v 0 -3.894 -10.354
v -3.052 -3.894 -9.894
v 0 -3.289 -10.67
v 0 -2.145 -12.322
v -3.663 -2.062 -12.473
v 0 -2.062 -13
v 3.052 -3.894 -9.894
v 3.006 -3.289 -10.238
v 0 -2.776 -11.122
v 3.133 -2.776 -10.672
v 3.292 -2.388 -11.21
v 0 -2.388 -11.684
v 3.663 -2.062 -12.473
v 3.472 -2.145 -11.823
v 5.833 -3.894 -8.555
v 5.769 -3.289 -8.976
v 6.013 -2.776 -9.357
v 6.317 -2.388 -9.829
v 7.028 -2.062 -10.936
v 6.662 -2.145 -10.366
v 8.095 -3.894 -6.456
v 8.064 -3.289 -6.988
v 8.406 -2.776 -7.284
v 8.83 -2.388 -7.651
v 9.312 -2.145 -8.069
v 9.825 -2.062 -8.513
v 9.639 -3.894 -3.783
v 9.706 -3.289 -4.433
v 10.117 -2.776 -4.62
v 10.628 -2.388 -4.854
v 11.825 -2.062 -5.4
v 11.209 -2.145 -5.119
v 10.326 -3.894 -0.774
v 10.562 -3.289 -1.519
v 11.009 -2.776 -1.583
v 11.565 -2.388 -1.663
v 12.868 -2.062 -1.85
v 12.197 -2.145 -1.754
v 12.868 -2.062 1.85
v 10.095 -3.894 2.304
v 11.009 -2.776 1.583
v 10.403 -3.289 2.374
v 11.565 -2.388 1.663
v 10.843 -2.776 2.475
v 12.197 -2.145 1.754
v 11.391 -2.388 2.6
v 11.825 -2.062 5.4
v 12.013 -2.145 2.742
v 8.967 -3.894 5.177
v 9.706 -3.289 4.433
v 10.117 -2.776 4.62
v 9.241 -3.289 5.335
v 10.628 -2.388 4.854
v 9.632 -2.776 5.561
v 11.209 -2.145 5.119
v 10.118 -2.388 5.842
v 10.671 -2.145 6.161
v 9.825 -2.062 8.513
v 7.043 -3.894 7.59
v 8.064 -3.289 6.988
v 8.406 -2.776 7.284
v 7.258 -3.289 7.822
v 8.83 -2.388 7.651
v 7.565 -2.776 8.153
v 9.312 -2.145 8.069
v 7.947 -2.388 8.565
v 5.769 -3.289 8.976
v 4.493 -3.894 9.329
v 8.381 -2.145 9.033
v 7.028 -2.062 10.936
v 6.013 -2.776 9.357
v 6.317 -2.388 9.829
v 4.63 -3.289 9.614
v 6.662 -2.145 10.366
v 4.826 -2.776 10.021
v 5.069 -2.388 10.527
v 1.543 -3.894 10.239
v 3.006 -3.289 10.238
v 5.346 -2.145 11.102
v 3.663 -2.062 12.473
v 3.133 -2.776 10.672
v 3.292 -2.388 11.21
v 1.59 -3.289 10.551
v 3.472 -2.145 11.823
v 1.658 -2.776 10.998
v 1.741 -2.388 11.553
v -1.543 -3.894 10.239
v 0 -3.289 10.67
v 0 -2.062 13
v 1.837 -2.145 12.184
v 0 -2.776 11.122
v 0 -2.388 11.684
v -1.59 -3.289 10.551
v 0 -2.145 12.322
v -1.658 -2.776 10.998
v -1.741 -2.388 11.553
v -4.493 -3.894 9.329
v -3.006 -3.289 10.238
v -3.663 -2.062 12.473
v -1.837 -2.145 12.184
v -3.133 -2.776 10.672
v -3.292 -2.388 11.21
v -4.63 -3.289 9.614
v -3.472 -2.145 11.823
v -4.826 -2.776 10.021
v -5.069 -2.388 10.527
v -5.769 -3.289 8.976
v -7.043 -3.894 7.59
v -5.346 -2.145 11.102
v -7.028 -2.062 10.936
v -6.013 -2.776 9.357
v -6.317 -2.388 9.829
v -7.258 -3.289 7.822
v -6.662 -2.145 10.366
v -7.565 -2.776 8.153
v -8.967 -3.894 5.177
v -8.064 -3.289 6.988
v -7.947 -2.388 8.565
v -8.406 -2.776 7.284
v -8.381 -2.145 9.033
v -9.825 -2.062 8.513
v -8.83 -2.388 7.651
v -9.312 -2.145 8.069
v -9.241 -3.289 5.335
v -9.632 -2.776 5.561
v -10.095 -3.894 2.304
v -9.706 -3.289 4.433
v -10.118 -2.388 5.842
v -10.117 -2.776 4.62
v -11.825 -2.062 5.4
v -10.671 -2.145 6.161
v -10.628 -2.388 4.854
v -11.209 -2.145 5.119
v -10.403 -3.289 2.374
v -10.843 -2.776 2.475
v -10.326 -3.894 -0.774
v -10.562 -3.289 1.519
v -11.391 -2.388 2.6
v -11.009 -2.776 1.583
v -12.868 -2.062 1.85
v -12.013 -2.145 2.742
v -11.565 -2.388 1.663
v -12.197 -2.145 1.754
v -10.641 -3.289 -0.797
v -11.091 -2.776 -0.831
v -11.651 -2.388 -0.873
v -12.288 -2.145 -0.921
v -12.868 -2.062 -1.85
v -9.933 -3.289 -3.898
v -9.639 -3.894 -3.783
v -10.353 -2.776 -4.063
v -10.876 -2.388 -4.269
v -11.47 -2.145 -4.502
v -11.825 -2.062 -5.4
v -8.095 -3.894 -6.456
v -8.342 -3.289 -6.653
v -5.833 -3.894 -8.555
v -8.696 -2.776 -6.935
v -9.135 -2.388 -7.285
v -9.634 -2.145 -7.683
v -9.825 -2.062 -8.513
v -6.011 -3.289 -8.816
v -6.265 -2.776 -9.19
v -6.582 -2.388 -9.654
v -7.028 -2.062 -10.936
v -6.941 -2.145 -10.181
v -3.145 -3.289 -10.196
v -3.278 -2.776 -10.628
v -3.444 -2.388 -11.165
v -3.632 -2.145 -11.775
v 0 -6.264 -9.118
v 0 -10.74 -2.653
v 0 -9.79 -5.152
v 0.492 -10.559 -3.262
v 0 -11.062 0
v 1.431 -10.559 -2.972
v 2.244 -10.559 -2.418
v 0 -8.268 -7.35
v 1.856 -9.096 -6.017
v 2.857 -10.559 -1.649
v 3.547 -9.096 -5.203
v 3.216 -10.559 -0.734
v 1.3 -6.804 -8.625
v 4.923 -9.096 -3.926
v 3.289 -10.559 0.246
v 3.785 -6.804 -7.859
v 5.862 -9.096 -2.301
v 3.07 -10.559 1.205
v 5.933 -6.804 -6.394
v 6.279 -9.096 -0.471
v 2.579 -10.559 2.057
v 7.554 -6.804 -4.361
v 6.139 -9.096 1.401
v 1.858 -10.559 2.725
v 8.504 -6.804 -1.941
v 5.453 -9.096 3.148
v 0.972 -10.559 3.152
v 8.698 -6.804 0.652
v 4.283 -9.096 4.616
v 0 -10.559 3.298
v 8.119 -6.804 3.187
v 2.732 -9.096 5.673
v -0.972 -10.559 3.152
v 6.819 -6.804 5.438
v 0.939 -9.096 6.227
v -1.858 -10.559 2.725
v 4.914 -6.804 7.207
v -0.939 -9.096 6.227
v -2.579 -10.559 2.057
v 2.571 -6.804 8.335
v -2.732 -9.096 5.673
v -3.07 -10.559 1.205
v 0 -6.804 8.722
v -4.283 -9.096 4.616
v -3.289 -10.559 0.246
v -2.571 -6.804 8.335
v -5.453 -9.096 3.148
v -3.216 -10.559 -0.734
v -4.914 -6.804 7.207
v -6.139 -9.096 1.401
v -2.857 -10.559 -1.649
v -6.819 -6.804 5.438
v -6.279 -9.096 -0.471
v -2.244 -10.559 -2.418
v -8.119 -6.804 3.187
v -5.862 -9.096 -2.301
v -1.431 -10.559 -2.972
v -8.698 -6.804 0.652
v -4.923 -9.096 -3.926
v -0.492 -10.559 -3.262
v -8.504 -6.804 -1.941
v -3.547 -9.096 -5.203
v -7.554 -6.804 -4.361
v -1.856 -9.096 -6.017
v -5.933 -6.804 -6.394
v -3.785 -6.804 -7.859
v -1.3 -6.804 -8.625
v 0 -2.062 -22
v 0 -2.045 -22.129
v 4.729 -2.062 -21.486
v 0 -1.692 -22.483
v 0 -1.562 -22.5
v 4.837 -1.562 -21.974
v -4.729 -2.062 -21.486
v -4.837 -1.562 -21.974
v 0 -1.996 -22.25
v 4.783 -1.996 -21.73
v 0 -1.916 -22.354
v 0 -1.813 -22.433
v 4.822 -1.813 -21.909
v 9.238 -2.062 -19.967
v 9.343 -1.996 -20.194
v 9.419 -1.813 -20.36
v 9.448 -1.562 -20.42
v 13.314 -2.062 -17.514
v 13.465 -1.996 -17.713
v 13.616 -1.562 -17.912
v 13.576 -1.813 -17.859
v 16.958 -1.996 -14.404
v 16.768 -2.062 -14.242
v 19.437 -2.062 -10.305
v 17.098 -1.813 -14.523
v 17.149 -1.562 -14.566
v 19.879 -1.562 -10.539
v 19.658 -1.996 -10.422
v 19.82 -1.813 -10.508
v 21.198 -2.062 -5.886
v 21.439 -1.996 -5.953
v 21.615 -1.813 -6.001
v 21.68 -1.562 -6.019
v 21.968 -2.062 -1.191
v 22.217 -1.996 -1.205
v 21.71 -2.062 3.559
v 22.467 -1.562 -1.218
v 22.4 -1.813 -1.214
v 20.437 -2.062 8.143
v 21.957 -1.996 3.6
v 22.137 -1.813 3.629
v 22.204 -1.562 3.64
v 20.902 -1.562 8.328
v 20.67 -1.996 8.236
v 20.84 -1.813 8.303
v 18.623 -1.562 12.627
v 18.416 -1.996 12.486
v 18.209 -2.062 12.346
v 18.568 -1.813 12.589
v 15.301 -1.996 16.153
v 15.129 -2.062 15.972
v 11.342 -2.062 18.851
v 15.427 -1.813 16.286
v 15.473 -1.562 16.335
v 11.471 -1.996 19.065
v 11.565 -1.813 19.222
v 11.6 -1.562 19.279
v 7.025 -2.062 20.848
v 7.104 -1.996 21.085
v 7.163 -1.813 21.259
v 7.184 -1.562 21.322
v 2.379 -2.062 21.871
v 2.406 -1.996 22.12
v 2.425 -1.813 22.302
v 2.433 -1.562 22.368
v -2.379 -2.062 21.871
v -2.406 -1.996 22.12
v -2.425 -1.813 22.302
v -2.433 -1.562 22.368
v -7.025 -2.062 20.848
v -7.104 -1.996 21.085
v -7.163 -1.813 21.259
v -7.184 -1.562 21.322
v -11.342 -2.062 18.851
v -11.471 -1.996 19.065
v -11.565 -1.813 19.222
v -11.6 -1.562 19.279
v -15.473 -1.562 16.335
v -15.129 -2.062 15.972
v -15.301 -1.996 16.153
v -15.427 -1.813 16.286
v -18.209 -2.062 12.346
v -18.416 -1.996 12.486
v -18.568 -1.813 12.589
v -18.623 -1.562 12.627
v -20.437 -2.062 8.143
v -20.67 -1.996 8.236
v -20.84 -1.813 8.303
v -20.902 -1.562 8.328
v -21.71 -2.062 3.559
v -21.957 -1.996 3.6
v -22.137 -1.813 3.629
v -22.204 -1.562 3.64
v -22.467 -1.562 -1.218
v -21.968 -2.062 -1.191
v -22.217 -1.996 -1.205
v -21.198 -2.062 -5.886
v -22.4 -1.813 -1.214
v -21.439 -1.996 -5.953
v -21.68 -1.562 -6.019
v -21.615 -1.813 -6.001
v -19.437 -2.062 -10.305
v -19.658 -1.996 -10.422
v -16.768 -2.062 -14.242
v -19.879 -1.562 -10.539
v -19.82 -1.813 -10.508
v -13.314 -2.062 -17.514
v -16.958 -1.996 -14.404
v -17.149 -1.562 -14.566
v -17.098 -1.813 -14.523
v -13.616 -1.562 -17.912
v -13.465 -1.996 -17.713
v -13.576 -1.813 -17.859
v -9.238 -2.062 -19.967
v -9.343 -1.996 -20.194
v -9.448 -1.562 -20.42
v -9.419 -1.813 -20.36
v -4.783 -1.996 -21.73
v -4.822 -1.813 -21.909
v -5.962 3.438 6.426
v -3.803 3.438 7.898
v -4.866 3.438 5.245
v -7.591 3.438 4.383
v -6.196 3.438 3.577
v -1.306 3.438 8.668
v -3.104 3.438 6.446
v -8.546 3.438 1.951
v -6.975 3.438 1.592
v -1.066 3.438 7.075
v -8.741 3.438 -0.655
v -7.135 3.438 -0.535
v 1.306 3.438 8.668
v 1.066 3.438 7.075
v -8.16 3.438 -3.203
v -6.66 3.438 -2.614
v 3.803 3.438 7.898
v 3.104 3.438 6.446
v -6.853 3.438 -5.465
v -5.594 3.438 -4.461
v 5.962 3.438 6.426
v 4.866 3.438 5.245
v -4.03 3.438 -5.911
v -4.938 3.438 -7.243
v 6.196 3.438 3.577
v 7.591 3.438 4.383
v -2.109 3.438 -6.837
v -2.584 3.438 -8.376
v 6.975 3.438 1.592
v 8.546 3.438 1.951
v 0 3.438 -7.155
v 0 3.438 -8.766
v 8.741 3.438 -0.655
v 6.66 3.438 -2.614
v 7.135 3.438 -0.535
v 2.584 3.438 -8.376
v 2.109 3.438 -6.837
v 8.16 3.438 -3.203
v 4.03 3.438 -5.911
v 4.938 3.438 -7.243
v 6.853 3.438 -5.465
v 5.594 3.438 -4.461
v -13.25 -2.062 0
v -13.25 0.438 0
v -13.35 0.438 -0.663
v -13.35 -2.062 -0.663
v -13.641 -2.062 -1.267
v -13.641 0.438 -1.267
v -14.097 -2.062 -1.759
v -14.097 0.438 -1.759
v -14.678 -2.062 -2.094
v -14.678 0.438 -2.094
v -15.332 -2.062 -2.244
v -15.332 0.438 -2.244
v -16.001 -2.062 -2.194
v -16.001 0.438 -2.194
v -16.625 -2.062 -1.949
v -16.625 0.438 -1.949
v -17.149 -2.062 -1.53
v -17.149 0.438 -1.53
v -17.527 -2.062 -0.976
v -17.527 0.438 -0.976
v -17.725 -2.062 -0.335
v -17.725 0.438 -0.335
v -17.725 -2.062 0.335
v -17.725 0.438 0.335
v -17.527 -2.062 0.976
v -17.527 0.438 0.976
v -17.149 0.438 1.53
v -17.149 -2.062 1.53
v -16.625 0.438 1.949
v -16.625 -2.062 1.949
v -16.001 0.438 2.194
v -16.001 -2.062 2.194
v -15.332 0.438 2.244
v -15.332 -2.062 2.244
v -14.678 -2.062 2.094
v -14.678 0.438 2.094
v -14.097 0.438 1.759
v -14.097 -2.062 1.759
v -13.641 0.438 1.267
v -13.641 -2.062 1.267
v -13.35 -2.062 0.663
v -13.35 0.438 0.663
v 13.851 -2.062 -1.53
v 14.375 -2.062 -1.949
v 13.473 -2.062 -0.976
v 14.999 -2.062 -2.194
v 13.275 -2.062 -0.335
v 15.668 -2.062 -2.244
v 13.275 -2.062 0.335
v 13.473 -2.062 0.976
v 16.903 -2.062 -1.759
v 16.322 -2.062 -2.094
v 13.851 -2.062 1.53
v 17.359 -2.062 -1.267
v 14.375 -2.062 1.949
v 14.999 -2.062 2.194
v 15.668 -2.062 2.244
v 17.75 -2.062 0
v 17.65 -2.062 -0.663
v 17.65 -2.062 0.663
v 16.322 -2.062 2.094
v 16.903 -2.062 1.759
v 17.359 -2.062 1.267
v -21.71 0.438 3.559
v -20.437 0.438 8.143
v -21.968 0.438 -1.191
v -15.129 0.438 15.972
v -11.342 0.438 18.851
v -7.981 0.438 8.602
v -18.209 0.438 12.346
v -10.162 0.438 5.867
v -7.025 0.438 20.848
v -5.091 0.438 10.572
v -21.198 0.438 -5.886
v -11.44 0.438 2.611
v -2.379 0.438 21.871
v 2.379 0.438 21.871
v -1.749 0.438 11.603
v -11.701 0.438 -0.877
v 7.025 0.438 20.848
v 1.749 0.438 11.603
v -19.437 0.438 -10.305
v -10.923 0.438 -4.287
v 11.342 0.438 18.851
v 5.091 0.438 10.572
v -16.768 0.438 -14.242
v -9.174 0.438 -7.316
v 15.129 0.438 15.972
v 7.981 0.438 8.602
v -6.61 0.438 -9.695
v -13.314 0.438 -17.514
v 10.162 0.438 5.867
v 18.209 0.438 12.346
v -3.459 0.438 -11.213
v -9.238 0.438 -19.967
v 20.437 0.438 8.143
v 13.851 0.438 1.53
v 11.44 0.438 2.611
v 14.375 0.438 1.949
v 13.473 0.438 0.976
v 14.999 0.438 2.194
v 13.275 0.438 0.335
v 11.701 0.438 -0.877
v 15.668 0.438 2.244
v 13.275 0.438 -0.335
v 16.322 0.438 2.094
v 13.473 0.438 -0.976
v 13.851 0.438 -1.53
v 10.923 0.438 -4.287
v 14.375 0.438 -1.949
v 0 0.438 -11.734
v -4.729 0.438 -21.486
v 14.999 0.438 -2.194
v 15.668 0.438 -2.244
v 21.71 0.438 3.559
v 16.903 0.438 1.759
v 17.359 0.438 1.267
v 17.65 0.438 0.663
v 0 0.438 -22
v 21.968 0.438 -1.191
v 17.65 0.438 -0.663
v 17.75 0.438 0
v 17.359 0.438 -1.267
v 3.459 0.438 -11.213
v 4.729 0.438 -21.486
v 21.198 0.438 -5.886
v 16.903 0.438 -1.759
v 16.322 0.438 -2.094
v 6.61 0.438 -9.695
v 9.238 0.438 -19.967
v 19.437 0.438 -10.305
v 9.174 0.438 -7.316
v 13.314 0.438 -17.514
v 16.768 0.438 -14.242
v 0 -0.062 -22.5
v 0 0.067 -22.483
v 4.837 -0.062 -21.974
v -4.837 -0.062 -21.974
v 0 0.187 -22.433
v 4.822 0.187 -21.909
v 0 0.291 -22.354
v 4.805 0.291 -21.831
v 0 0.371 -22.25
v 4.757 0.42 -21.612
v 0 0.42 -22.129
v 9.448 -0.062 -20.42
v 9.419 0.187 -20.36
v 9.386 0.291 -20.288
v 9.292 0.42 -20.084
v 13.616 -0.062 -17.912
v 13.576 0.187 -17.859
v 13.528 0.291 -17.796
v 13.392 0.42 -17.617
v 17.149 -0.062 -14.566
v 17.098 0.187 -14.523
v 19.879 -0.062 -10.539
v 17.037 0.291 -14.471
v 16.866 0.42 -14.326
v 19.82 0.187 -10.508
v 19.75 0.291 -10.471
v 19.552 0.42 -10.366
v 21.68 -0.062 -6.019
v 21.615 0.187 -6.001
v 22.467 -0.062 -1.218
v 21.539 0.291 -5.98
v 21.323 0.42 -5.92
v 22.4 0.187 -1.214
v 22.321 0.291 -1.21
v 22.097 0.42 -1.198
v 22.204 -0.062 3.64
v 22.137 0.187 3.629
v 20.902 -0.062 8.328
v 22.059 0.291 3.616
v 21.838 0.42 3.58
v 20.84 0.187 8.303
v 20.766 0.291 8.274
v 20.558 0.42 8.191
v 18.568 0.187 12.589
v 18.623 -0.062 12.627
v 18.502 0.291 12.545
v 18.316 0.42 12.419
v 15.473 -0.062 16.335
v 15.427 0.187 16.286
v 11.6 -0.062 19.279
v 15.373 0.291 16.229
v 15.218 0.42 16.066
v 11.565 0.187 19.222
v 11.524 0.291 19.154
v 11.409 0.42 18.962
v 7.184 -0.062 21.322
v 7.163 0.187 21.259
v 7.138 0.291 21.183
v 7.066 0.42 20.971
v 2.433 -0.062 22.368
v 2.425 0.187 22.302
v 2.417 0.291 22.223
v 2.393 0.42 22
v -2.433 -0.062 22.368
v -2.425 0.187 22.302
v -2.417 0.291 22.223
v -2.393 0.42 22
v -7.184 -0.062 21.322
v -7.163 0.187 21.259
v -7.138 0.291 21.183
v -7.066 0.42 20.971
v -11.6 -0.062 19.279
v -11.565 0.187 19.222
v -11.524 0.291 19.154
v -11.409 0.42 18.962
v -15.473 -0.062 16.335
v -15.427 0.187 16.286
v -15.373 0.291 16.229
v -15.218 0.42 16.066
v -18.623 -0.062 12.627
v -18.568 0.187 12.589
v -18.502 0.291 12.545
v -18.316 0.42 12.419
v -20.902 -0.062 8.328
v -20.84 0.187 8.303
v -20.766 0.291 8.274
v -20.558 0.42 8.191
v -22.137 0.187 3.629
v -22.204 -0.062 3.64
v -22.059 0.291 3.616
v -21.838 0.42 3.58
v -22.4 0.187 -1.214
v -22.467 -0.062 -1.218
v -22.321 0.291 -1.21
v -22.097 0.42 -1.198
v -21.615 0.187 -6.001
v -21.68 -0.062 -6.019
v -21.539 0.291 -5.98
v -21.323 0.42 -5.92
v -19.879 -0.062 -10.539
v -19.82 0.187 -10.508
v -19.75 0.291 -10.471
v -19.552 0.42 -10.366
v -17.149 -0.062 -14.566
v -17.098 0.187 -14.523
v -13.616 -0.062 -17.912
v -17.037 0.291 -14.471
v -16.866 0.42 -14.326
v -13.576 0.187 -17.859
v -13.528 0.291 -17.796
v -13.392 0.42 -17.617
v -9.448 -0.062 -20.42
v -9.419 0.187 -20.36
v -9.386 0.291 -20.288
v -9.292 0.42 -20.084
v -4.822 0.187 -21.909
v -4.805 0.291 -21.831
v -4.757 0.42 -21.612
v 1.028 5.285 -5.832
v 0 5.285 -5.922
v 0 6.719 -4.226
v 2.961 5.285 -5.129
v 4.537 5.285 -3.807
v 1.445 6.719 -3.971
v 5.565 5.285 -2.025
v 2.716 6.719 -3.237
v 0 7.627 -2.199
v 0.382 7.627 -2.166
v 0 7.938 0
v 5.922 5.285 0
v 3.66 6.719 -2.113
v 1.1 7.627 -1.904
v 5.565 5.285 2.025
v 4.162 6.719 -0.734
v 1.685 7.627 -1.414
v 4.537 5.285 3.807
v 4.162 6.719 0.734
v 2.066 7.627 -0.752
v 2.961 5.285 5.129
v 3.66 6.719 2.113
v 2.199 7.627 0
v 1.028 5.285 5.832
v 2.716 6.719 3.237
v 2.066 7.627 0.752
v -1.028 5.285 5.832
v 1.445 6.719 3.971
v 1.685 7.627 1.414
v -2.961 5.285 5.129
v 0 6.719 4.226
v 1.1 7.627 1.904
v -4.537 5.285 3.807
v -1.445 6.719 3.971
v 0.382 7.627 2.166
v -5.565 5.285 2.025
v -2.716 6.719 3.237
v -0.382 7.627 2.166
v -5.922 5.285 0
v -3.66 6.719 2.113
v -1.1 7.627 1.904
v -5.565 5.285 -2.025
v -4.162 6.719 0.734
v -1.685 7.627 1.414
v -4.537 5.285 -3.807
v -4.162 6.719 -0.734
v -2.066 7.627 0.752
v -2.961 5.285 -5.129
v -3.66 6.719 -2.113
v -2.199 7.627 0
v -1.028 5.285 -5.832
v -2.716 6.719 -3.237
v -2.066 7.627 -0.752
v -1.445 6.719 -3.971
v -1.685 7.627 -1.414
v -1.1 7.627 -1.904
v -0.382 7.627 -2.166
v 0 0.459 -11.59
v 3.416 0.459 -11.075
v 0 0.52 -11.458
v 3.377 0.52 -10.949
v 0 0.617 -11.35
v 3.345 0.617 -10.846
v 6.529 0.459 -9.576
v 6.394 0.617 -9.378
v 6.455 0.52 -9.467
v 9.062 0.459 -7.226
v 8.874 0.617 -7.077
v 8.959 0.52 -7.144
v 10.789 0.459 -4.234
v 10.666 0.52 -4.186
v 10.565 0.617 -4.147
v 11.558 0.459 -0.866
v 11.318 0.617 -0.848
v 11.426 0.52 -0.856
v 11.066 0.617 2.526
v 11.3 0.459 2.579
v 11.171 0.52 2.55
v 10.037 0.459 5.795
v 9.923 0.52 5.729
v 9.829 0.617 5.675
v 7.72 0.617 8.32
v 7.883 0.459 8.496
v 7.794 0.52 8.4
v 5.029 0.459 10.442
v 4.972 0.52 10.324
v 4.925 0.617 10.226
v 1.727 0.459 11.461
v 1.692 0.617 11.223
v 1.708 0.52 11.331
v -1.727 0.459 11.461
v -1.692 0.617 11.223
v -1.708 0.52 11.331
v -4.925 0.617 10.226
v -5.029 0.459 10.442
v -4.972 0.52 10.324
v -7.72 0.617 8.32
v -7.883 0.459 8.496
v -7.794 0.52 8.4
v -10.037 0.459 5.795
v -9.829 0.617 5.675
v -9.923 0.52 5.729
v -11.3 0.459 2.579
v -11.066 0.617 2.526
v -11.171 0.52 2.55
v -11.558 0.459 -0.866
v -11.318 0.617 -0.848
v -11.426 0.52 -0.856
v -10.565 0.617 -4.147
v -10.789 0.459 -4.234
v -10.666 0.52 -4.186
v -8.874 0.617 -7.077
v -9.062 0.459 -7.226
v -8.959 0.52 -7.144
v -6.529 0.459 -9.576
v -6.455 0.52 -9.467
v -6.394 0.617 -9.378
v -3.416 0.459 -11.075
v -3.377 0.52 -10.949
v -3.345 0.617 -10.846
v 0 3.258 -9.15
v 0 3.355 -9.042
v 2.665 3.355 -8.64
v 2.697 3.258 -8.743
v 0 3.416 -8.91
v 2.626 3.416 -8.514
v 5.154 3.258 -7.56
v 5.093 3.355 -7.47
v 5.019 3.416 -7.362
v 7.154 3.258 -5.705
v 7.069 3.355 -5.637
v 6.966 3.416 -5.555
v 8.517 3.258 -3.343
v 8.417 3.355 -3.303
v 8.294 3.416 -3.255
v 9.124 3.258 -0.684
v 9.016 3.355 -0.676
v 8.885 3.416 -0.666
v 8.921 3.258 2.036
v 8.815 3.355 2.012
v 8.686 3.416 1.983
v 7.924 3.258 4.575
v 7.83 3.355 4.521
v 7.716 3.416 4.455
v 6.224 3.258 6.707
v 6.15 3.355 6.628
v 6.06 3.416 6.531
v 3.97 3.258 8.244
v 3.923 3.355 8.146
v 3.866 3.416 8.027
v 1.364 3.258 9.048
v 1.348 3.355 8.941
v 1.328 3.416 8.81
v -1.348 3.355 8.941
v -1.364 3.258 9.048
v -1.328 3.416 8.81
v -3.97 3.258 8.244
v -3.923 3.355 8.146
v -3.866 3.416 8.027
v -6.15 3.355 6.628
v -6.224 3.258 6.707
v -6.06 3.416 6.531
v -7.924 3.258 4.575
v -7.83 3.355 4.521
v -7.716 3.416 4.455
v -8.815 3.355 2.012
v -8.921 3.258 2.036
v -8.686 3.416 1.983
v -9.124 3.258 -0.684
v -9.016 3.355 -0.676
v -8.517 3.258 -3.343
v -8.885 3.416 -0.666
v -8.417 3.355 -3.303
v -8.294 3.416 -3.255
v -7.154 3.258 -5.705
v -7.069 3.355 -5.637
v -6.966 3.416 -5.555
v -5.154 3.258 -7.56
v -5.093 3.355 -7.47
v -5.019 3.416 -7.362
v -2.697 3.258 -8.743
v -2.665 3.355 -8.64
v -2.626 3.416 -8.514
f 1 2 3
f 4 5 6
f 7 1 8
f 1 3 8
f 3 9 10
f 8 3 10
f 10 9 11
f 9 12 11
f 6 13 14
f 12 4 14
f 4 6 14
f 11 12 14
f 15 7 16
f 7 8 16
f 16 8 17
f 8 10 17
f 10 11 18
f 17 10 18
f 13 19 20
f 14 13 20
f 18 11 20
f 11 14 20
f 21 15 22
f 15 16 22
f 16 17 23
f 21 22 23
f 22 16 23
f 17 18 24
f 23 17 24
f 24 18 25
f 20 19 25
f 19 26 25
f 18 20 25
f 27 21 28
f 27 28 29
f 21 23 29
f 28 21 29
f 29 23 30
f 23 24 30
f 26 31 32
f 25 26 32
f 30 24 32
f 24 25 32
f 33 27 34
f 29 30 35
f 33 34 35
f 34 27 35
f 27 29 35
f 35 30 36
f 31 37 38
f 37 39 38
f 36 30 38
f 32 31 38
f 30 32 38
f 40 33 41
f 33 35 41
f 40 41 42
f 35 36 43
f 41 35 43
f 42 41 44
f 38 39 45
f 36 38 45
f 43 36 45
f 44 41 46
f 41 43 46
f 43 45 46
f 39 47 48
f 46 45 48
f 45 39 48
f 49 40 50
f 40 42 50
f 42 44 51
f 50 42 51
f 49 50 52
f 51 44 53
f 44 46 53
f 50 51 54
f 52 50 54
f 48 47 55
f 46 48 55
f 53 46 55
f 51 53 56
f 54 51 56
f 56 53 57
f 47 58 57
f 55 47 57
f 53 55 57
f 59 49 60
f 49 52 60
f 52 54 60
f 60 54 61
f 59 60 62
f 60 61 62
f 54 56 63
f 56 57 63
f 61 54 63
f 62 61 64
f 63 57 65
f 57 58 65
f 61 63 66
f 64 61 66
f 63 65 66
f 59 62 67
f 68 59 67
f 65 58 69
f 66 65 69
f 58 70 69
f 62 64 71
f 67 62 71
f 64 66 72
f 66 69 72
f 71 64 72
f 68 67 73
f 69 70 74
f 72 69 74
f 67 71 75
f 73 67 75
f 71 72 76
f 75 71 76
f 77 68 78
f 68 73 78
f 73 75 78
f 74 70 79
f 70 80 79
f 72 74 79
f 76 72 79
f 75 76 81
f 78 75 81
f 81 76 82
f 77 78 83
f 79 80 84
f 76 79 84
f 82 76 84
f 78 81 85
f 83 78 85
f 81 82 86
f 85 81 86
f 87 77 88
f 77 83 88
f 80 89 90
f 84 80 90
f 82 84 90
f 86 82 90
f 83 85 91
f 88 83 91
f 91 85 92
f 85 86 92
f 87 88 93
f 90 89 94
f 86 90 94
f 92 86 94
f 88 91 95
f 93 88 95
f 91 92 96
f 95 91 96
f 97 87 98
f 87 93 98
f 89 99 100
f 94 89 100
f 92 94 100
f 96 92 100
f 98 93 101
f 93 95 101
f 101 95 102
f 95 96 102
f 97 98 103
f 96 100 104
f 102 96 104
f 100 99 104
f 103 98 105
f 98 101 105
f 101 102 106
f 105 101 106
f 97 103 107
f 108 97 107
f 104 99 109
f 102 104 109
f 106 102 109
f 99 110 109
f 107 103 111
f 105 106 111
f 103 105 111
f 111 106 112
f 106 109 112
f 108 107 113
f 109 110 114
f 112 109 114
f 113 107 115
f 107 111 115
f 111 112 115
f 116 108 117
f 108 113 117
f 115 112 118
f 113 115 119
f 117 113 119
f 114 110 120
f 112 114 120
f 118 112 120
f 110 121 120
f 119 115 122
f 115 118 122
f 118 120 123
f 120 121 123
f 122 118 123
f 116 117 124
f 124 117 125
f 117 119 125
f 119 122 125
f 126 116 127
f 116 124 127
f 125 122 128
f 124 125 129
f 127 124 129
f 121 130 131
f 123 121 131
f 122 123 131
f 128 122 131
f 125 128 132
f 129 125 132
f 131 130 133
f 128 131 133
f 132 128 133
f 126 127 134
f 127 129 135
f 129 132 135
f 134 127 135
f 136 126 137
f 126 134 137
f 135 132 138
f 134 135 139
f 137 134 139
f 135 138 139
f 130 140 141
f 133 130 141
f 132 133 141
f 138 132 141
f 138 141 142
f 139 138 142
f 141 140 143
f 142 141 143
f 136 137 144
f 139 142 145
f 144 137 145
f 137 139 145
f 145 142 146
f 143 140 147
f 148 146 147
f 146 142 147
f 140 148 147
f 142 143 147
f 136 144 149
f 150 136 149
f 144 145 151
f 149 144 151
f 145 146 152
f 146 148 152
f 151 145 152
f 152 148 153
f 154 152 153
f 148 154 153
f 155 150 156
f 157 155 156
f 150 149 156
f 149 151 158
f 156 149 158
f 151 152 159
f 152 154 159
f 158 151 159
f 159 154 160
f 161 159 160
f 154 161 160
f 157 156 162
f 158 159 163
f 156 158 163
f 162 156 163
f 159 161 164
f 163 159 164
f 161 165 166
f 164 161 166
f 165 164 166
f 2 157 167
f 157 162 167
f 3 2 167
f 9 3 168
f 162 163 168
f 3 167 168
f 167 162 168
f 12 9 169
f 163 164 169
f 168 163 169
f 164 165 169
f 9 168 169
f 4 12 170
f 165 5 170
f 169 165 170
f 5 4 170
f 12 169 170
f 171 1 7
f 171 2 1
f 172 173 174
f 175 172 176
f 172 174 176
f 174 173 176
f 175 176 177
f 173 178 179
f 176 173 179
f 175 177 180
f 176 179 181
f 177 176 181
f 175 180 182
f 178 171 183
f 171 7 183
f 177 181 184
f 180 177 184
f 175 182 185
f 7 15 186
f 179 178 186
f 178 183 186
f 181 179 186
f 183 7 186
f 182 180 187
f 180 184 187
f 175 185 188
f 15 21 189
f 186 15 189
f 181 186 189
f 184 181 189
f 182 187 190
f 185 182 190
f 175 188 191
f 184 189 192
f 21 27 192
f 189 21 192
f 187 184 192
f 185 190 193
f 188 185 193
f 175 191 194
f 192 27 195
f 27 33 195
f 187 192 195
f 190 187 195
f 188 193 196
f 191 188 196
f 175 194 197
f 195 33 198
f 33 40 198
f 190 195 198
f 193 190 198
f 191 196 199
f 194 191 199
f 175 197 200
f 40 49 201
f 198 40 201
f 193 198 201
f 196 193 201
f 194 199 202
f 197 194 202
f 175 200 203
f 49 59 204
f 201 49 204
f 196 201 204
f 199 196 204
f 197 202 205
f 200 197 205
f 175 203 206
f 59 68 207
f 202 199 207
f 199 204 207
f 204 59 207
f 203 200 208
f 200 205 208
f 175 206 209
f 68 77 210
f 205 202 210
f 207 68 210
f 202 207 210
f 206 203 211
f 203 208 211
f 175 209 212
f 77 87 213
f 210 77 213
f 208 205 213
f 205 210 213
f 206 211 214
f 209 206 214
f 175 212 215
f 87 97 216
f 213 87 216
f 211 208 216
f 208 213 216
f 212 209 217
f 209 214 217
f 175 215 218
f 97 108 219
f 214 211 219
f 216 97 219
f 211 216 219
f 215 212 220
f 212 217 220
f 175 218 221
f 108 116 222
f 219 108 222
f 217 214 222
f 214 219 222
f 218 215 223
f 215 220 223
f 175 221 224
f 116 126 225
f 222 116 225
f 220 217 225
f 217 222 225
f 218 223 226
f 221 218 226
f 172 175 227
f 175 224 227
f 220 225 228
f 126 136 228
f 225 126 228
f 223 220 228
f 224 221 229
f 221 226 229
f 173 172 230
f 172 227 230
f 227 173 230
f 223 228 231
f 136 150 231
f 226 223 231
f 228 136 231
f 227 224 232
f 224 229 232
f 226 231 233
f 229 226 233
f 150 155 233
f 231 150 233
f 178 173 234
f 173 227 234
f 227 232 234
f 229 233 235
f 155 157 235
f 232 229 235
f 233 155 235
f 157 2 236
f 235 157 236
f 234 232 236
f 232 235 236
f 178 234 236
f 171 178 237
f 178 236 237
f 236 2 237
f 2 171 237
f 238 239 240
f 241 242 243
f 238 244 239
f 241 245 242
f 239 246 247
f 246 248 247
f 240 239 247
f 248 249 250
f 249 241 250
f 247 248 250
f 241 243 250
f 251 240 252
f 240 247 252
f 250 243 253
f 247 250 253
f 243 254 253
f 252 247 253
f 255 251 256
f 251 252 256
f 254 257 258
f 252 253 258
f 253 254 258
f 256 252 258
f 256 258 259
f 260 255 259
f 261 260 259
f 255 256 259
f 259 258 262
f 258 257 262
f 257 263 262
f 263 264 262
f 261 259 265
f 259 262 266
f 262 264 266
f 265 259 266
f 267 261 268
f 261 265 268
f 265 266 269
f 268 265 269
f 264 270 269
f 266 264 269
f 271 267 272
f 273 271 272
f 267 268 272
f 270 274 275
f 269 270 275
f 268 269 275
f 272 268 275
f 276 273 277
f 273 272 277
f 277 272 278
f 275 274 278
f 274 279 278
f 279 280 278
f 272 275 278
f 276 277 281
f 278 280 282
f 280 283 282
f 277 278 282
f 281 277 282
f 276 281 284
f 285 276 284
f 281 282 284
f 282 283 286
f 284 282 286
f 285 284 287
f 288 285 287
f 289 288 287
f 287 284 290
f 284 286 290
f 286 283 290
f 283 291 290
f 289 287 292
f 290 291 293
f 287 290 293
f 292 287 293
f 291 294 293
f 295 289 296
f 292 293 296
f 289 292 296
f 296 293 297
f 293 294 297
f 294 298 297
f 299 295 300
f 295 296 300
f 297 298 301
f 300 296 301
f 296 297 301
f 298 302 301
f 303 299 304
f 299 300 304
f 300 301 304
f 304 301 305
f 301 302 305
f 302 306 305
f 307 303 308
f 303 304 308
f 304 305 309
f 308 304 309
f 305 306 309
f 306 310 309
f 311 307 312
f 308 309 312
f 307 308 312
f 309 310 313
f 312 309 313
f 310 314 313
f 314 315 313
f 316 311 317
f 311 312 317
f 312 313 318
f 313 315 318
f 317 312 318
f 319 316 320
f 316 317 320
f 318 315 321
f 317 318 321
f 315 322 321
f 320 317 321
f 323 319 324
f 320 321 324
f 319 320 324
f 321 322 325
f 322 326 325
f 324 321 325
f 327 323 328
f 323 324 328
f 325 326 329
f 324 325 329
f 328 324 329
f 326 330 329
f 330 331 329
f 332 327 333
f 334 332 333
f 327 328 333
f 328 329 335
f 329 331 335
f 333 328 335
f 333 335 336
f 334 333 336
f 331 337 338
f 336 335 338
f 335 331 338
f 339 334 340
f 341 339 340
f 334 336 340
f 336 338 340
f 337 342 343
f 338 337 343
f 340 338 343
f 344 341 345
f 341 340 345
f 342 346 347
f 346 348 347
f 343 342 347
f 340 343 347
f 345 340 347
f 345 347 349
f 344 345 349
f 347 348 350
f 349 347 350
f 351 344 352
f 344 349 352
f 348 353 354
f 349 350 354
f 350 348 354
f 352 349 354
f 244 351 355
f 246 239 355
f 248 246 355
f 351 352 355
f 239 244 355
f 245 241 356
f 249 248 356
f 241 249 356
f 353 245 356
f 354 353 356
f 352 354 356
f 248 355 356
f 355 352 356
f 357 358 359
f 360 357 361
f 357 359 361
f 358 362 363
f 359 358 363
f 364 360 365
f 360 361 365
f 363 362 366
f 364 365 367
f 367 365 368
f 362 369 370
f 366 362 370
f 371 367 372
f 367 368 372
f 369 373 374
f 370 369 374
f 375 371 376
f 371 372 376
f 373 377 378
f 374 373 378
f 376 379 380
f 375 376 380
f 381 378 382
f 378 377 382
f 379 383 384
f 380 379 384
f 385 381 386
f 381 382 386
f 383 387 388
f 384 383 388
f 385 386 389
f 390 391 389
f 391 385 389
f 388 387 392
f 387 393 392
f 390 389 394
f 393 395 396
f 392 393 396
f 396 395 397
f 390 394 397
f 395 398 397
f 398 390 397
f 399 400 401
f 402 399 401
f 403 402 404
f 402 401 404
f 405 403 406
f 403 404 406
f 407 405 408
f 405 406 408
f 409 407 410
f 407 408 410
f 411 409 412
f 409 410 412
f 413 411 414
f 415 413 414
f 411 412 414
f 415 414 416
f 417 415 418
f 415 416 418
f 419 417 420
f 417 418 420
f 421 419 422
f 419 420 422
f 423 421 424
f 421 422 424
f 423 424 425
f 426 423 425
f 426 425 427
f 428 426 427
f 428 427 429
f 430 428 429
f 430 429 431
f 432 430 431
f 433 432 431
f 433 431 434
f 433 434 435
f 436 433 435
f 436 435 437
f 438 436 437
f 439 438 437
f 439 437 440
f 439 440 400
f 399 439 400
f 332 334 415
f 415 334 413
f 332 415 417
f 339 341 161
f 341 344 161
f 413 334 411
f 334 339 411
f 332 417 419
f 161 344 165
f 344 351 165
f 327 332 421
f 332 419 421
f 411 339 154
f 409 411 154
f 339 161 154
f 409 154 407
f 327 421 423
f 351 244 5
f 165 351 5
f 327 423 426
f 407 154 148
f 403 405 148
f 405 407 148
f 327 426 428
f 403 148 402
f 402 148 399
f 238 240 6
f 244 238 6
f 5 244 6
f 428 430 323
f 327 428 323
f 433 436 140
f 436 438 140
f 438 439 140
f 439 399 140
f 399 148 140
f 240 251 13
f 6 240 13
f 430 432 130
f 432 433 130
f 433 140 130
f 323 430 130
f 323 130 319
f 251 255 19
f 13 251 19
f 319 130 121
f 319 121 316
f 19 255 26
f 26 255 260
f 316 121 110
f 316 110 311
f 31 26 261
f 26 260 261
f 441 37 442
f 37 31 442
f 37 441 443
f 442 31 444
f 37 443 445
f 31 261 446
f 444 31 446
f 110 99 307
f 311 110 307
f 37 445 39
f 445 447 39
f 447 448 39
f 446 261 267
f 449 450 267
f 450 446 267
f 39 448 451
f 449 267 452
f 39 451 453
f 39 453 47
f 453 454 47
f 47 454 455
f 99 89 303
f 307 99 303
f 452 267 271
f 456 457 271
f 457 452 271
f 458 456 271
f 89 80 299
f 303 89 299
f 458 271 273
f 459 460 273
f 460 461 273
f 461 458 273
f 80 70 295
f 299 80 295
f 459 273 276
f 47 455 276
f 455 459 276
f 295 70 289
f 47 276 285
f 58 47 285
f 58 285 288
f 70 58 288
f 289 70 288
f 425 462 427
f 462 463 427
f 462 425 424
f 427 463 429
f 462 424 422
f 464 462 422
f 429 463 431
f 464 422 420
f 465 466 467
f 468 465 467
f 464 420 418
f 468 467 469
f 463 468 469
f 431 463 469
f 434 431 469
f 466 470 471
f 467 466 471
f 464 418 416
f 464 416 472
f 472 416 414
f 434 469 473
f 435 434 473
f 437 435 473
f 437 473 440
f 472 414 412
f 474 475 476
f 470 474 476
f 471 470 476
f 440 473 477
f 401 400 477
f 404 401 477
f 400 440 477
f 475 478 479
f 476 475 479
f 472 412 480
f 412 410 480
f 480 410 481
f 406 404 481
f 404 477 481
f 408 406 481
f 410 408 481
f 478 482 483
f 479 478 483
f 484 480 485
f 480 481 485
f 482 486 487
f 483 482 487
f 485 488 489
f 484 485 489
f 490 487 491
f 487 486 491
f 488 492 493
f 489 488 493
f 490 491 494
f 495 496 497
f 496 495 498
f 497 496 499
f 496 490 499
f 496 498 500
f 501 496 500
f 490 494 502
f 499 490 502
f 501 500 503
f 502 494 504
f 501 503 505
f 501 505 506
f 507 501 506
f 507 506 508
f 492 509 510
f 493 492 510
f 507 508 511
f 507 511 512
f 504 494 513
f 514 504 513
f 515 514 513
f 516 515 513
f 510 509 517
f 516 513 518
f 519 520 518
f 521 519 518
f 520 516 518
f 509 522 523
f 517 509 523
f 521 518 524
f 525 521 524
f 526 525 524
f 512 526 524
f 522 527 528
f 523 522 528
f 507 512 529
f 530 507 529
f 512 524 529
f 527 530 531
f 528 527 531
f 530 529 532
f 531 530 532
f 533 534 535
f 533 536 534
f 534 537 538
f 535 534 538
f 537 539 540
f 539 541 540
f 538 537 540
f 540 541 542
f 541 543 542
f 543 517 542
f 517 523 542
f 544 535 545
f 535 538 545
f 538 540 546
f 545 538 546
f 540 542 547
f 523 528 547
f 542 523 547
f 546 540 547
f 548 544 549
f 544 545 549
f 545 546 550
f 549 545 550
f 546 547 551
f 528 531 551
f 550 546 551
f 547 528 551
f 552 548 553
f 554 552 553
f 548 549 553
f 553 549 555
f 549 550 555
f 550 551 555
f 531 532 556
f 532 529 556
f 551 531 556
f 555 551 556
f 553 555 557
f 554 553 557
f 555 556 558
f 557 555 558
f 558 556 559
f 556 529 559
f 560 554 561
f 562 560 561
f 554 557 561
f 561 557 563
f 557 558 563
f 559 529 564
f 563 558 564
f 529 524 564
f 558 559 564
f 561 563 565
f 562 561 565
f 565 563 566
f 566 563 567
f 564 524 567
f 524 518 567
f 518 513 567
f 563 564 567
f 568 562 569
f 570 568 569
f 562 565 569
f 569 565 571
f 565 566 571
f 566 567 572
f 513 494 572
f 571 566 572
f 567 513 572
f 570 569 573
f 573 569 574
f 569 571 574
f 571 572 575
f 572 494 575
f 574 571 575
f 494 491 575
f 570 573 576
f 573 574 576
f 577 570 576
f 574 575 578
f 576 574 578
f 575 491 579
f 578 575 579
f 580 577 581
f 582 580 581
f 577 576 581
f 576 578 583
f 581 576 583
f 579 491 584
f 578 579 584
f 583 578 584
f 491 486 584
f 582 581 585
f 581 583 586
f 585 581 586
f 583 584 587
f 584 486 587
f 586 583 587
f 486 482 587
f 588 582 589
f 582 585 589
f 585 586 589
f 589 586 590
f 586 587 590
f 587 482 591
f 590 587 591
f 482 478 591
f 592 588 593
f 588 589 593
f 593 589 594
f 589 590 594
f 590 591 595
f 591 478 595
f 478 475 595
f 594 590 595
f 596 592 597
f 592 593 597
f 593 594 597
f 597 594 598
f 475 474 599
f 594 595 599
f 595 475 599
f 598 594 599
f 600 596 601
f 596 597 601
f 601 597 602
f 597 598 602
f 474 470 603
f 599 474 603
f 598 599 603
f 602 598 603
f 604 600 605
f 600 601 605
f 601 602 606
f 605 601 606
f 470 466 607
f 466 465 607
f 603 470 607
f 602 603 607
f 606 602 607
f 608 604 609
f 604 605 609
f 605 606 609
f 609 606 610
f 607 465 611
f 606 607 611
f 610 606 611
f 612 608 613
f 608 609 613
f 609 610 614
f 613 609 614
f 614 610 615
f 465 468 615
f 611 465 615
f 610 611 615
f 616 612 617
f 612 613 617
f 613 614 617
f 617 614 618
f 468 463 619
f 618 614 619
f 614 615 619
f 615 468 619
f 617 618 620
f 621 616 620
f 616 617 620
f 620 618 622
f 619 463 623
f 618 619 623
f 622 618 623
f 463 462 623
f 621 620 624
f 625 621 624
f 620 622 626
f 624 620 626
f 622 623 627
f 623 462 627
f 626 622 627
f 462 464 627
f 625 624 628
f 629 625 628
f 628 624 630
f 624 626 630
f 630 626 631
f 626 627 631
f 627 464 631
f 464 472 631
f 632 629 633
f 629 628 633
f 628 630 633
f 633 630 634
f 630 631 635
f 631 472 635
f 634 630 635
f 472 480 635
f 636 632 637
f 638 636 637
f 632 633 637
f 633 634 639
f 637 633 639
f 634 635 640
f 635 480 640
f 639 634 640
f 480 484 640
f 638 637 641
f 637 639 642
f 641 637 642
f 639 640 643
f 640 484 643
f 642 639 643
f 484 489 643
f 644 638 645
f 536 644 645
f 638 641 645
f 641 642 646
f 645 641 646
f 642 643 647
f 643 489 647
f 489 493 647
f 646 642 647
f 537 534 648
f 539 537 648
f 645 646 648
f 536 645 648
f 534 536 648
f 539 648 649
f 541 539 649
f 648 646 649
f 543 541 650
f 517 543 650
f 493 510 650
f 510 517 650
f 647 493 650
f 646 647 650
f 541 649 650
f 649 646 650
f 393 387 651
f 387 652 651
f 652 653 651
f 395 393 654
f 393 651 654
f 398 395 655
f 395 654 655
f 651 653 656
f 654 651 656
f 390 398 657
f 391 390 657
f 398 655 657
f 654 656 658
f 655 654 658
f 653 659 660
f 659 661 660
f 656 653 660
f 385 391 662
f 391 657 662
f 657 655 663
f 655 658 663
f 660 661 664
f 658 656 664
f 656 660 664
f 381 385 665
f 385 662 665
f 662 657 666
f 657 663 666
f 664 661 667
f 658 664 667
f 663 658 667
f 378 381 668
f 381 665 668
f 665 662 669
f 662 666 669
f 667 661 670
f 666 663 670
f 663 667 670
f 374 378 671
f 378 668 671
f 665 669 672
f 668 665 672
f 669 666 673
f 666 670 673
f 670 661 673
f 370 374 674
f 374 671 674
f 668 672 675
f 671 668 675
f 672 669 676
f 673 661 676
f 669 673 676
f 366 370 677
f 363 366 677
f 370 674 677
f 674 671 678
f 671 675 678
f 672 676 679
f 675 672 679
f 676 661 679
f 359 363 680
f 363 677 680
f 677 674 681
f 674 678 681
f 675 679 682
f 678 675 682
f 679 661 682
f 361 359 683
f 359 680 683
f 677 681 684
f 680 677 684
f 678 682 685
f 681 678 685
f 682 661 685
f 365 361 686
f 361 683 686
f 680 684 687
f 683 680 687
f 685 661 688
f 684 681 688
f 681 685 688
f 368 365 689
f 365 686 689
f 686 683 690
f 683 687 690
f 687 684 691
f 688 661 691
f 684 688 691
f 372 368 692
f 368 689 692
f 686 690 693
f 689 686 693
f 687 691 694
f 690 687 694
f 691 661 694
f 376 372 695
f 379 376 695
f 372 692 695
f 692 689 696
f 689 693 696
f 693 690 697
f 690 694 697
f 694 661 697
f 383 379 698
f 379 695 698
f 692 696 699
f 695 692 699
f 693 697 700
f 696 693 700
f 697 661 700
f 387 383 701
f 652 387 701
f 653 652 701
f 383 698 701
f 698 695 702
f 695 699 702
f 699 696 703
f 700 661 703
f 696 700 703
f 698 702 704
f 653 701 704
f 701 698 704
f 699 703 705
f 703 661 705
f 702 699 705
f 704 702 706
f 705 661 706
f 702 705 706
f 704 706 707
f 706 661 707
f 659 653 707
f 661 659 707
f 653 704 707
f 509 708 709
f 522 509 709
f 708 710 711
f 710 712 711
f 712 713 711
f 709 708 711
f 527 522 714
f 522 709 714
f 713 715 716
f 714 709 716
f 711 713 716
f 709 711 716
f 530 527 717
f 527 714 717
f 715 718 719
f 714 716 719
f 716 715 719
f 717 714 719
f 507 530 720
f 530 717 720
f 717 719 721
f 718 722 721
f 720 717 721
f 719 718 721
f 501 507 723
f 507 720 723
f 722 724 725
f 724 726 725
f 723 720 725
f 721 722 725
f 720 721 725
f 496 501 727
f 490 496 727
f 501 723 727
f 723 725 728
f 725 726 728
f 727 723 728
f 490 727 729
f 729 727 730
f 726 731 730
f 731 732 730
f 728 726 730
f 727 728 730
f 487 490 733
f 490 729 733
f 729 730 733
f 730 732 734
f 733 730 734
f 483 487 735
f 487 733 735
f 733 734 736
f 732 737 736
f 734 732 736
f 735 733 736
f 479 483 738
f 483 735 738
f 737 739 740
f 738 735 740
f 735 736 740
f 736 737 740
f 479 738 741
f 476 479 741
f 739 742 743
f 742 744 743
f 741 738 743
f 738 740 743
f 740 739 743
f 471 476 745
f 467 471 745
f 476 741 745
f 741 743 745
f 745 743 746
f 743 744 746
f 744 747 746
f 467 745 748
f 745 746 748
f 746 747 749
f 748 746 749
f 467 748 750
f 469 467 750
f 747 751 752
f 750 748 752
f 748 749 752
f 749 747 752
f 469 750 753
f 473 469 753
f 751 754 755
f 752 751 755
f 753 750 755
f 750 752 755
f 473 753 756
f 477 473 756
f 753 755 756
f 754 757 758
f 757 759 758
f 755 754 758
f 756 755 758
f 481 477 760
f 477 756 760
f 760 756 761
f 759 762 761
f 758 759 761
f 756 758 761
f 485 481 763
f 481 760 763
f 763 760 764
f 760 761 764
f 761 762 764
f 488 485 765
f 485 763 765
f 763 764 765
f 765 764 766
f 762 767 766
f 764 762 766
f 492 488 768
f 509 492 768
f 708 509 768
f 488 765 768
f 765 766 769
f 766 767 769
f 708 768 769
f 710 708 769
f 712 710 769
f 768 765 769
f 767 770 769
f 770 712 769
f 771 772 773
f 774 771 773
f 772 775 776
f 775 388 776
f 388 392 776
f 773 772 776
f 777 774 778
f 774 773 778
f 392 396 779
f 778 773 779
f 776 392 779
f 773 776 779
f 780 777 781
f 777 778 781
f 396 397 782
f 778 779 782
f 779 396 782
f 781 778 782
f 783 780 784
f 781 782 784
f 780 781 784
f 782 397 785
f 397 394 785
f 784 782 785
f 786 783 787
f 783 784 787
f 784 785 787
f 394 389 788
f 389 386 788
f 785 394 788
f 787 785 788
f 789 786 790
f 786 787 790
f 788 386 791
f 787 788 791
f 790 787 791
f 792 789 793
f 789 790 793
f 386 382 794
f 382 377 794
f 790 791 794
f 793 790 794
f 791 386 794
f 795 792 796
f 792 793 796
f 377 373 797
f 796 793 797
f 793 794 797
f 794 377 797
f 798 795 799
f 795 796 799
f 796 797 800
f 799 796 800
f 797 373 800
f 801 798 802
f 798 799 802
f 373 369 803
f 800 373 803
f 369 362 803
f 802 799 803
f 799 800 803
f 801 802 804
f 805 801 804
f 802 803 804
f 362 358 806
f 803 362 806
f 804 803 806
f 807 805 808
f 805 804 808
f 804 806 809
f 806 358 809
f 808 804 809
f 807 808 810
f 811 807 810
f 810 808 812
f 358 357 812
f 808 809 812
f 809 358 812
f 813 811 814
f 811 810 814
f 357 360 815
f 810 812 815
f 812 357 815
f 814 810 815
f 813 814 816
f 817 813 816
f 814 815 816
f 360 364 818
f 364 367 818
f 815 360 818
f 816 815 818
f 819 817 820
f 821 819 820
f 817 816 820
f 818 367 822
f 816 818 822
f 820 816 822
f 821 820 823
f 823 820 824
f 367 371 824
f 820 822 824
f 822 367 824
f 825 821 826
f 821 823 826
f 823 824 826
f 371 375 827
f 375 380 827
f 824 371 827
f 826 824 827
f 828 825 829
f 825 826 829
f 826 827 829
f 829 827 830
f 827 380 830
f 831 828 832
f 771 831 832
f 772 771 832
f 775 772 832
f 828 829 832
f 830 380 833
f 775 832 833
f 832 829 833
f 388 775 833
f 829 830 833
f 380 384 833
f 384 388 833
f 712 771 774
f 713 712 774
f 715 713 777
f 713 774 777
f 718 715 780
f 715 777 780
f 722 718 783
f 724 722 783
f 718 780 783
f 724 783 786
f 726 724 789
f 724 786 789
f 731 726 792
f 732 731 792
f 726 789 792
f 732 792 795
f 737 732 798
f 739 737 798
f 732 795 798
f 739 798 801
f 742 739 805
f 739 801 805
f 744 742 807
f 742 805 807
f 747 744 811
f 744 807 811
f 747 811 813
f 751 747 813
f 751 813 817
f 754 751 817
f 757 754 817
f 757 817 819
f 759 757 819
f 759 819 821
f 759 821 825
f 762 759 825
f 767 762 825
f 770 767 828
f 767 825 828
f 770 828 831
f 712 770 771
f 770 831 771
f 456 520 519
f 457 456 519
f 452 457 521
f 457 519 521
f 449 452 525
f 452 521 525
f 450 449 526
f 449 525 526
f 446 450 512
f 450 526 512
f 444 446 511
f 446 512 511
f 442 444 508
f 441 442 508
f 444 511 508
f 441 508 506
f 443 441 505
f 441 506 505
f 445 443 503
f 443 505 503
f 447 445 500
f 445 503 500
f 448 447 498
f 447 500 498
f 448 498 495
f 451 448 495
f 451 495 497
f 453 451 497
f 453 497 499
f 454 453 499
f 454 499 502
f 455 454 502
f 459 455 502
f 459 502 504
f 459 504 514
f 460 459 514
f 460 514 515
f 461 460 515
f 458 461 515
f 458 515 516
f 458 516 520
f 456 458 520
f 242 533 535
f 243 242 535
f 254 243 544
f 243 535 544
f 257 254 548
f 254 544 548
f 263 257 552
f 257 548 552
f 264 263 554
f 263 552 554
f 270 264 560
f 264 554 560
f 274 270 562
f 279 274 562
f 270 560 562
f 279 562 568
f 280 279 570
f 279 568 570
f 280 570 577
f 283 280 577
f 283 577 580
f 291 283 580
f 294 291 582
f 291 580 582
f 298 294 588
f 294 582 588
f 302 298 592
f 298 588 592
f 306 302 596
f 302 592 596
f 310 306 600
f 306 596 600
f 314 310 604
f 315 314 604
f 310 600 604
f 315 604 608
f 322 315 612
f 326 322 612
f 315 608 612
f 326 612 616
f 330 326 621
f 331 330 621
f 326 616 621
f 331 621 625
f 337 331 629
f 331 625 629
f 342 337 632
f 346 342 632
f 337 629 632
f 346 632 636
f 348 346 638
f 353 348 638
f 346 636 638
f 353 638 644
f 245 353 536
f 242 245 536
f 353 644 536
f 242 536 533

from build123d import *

# Parameters (mm, degrees)
SKETCH3_R          = 2.25
CUT_EXTRUDE1_DEPTH = 12.5
FILLET1_R          = 0.5


with BuildPart() as part:
    # Sketch2 → Revolve1 (revolve)
    with BuildSketch(Plane(origin=(0, 0, 0), x_dir=(0, 0, -1), z_dir=(1, 0, 0))):
        with BuildLine():
            Line((0, 7.9375), (0, -11.0625))
            ThreePointArc((0, -11.0625), (6.296885391, -9.09550112), (10.3545, -3.894))
            ThreePointArc((10.3545, -3.894), (11.39119124, -2.565054014), (13, -2.0625))
            Line((13, -2.0625), (22.5, -2.0625))
            Line((22.5, -2.0625), (22.5, 0.4375))
            Line((22.5, 0.4375), (11.5, 0.4375))
            Line((11.5, 0.4375), (9, 3.4375))
            Line((9, 3.4375), (7.154544011, 3.4375))
            ThreePointArc((7.154544011, 3.4375), (4.226035376, 6.71896802), (0, 7.9375))
        make_face()
    revolve(axis=Axis((0, 7.9375, 0), (0, -1, 0)))

    # Sketch3 → Cut-Extrude1 (cut, through all)
    with BuildSketch(Plane(origin=(0, 0.4375, 0), x_dir=(1, 0, 0), z_dir=(0, 1, 0))):
        with Locations((-15.5, 0)):
            Circle(SKETCH3_R)
        with Locations((15.5, 0)):
            Circle(SKETCH3_R)
    extrude(amount=-CUT_EXTRUDE1_DEPTH, mode=Mode.SUBTRACT)

    # Fillet1
    fillet1_edges = [part.edges().sort_by_distance(p)[0] for p in [
        (0, 0.4375, 11.5),
        (0, 3.4375, 9),
        (0, -2.0625, 22.5),
        (0, 0.4375, 22.5),
    ]]
    fillet(fillet1_edges, radius=FILLET1_R)


solid = part.part
